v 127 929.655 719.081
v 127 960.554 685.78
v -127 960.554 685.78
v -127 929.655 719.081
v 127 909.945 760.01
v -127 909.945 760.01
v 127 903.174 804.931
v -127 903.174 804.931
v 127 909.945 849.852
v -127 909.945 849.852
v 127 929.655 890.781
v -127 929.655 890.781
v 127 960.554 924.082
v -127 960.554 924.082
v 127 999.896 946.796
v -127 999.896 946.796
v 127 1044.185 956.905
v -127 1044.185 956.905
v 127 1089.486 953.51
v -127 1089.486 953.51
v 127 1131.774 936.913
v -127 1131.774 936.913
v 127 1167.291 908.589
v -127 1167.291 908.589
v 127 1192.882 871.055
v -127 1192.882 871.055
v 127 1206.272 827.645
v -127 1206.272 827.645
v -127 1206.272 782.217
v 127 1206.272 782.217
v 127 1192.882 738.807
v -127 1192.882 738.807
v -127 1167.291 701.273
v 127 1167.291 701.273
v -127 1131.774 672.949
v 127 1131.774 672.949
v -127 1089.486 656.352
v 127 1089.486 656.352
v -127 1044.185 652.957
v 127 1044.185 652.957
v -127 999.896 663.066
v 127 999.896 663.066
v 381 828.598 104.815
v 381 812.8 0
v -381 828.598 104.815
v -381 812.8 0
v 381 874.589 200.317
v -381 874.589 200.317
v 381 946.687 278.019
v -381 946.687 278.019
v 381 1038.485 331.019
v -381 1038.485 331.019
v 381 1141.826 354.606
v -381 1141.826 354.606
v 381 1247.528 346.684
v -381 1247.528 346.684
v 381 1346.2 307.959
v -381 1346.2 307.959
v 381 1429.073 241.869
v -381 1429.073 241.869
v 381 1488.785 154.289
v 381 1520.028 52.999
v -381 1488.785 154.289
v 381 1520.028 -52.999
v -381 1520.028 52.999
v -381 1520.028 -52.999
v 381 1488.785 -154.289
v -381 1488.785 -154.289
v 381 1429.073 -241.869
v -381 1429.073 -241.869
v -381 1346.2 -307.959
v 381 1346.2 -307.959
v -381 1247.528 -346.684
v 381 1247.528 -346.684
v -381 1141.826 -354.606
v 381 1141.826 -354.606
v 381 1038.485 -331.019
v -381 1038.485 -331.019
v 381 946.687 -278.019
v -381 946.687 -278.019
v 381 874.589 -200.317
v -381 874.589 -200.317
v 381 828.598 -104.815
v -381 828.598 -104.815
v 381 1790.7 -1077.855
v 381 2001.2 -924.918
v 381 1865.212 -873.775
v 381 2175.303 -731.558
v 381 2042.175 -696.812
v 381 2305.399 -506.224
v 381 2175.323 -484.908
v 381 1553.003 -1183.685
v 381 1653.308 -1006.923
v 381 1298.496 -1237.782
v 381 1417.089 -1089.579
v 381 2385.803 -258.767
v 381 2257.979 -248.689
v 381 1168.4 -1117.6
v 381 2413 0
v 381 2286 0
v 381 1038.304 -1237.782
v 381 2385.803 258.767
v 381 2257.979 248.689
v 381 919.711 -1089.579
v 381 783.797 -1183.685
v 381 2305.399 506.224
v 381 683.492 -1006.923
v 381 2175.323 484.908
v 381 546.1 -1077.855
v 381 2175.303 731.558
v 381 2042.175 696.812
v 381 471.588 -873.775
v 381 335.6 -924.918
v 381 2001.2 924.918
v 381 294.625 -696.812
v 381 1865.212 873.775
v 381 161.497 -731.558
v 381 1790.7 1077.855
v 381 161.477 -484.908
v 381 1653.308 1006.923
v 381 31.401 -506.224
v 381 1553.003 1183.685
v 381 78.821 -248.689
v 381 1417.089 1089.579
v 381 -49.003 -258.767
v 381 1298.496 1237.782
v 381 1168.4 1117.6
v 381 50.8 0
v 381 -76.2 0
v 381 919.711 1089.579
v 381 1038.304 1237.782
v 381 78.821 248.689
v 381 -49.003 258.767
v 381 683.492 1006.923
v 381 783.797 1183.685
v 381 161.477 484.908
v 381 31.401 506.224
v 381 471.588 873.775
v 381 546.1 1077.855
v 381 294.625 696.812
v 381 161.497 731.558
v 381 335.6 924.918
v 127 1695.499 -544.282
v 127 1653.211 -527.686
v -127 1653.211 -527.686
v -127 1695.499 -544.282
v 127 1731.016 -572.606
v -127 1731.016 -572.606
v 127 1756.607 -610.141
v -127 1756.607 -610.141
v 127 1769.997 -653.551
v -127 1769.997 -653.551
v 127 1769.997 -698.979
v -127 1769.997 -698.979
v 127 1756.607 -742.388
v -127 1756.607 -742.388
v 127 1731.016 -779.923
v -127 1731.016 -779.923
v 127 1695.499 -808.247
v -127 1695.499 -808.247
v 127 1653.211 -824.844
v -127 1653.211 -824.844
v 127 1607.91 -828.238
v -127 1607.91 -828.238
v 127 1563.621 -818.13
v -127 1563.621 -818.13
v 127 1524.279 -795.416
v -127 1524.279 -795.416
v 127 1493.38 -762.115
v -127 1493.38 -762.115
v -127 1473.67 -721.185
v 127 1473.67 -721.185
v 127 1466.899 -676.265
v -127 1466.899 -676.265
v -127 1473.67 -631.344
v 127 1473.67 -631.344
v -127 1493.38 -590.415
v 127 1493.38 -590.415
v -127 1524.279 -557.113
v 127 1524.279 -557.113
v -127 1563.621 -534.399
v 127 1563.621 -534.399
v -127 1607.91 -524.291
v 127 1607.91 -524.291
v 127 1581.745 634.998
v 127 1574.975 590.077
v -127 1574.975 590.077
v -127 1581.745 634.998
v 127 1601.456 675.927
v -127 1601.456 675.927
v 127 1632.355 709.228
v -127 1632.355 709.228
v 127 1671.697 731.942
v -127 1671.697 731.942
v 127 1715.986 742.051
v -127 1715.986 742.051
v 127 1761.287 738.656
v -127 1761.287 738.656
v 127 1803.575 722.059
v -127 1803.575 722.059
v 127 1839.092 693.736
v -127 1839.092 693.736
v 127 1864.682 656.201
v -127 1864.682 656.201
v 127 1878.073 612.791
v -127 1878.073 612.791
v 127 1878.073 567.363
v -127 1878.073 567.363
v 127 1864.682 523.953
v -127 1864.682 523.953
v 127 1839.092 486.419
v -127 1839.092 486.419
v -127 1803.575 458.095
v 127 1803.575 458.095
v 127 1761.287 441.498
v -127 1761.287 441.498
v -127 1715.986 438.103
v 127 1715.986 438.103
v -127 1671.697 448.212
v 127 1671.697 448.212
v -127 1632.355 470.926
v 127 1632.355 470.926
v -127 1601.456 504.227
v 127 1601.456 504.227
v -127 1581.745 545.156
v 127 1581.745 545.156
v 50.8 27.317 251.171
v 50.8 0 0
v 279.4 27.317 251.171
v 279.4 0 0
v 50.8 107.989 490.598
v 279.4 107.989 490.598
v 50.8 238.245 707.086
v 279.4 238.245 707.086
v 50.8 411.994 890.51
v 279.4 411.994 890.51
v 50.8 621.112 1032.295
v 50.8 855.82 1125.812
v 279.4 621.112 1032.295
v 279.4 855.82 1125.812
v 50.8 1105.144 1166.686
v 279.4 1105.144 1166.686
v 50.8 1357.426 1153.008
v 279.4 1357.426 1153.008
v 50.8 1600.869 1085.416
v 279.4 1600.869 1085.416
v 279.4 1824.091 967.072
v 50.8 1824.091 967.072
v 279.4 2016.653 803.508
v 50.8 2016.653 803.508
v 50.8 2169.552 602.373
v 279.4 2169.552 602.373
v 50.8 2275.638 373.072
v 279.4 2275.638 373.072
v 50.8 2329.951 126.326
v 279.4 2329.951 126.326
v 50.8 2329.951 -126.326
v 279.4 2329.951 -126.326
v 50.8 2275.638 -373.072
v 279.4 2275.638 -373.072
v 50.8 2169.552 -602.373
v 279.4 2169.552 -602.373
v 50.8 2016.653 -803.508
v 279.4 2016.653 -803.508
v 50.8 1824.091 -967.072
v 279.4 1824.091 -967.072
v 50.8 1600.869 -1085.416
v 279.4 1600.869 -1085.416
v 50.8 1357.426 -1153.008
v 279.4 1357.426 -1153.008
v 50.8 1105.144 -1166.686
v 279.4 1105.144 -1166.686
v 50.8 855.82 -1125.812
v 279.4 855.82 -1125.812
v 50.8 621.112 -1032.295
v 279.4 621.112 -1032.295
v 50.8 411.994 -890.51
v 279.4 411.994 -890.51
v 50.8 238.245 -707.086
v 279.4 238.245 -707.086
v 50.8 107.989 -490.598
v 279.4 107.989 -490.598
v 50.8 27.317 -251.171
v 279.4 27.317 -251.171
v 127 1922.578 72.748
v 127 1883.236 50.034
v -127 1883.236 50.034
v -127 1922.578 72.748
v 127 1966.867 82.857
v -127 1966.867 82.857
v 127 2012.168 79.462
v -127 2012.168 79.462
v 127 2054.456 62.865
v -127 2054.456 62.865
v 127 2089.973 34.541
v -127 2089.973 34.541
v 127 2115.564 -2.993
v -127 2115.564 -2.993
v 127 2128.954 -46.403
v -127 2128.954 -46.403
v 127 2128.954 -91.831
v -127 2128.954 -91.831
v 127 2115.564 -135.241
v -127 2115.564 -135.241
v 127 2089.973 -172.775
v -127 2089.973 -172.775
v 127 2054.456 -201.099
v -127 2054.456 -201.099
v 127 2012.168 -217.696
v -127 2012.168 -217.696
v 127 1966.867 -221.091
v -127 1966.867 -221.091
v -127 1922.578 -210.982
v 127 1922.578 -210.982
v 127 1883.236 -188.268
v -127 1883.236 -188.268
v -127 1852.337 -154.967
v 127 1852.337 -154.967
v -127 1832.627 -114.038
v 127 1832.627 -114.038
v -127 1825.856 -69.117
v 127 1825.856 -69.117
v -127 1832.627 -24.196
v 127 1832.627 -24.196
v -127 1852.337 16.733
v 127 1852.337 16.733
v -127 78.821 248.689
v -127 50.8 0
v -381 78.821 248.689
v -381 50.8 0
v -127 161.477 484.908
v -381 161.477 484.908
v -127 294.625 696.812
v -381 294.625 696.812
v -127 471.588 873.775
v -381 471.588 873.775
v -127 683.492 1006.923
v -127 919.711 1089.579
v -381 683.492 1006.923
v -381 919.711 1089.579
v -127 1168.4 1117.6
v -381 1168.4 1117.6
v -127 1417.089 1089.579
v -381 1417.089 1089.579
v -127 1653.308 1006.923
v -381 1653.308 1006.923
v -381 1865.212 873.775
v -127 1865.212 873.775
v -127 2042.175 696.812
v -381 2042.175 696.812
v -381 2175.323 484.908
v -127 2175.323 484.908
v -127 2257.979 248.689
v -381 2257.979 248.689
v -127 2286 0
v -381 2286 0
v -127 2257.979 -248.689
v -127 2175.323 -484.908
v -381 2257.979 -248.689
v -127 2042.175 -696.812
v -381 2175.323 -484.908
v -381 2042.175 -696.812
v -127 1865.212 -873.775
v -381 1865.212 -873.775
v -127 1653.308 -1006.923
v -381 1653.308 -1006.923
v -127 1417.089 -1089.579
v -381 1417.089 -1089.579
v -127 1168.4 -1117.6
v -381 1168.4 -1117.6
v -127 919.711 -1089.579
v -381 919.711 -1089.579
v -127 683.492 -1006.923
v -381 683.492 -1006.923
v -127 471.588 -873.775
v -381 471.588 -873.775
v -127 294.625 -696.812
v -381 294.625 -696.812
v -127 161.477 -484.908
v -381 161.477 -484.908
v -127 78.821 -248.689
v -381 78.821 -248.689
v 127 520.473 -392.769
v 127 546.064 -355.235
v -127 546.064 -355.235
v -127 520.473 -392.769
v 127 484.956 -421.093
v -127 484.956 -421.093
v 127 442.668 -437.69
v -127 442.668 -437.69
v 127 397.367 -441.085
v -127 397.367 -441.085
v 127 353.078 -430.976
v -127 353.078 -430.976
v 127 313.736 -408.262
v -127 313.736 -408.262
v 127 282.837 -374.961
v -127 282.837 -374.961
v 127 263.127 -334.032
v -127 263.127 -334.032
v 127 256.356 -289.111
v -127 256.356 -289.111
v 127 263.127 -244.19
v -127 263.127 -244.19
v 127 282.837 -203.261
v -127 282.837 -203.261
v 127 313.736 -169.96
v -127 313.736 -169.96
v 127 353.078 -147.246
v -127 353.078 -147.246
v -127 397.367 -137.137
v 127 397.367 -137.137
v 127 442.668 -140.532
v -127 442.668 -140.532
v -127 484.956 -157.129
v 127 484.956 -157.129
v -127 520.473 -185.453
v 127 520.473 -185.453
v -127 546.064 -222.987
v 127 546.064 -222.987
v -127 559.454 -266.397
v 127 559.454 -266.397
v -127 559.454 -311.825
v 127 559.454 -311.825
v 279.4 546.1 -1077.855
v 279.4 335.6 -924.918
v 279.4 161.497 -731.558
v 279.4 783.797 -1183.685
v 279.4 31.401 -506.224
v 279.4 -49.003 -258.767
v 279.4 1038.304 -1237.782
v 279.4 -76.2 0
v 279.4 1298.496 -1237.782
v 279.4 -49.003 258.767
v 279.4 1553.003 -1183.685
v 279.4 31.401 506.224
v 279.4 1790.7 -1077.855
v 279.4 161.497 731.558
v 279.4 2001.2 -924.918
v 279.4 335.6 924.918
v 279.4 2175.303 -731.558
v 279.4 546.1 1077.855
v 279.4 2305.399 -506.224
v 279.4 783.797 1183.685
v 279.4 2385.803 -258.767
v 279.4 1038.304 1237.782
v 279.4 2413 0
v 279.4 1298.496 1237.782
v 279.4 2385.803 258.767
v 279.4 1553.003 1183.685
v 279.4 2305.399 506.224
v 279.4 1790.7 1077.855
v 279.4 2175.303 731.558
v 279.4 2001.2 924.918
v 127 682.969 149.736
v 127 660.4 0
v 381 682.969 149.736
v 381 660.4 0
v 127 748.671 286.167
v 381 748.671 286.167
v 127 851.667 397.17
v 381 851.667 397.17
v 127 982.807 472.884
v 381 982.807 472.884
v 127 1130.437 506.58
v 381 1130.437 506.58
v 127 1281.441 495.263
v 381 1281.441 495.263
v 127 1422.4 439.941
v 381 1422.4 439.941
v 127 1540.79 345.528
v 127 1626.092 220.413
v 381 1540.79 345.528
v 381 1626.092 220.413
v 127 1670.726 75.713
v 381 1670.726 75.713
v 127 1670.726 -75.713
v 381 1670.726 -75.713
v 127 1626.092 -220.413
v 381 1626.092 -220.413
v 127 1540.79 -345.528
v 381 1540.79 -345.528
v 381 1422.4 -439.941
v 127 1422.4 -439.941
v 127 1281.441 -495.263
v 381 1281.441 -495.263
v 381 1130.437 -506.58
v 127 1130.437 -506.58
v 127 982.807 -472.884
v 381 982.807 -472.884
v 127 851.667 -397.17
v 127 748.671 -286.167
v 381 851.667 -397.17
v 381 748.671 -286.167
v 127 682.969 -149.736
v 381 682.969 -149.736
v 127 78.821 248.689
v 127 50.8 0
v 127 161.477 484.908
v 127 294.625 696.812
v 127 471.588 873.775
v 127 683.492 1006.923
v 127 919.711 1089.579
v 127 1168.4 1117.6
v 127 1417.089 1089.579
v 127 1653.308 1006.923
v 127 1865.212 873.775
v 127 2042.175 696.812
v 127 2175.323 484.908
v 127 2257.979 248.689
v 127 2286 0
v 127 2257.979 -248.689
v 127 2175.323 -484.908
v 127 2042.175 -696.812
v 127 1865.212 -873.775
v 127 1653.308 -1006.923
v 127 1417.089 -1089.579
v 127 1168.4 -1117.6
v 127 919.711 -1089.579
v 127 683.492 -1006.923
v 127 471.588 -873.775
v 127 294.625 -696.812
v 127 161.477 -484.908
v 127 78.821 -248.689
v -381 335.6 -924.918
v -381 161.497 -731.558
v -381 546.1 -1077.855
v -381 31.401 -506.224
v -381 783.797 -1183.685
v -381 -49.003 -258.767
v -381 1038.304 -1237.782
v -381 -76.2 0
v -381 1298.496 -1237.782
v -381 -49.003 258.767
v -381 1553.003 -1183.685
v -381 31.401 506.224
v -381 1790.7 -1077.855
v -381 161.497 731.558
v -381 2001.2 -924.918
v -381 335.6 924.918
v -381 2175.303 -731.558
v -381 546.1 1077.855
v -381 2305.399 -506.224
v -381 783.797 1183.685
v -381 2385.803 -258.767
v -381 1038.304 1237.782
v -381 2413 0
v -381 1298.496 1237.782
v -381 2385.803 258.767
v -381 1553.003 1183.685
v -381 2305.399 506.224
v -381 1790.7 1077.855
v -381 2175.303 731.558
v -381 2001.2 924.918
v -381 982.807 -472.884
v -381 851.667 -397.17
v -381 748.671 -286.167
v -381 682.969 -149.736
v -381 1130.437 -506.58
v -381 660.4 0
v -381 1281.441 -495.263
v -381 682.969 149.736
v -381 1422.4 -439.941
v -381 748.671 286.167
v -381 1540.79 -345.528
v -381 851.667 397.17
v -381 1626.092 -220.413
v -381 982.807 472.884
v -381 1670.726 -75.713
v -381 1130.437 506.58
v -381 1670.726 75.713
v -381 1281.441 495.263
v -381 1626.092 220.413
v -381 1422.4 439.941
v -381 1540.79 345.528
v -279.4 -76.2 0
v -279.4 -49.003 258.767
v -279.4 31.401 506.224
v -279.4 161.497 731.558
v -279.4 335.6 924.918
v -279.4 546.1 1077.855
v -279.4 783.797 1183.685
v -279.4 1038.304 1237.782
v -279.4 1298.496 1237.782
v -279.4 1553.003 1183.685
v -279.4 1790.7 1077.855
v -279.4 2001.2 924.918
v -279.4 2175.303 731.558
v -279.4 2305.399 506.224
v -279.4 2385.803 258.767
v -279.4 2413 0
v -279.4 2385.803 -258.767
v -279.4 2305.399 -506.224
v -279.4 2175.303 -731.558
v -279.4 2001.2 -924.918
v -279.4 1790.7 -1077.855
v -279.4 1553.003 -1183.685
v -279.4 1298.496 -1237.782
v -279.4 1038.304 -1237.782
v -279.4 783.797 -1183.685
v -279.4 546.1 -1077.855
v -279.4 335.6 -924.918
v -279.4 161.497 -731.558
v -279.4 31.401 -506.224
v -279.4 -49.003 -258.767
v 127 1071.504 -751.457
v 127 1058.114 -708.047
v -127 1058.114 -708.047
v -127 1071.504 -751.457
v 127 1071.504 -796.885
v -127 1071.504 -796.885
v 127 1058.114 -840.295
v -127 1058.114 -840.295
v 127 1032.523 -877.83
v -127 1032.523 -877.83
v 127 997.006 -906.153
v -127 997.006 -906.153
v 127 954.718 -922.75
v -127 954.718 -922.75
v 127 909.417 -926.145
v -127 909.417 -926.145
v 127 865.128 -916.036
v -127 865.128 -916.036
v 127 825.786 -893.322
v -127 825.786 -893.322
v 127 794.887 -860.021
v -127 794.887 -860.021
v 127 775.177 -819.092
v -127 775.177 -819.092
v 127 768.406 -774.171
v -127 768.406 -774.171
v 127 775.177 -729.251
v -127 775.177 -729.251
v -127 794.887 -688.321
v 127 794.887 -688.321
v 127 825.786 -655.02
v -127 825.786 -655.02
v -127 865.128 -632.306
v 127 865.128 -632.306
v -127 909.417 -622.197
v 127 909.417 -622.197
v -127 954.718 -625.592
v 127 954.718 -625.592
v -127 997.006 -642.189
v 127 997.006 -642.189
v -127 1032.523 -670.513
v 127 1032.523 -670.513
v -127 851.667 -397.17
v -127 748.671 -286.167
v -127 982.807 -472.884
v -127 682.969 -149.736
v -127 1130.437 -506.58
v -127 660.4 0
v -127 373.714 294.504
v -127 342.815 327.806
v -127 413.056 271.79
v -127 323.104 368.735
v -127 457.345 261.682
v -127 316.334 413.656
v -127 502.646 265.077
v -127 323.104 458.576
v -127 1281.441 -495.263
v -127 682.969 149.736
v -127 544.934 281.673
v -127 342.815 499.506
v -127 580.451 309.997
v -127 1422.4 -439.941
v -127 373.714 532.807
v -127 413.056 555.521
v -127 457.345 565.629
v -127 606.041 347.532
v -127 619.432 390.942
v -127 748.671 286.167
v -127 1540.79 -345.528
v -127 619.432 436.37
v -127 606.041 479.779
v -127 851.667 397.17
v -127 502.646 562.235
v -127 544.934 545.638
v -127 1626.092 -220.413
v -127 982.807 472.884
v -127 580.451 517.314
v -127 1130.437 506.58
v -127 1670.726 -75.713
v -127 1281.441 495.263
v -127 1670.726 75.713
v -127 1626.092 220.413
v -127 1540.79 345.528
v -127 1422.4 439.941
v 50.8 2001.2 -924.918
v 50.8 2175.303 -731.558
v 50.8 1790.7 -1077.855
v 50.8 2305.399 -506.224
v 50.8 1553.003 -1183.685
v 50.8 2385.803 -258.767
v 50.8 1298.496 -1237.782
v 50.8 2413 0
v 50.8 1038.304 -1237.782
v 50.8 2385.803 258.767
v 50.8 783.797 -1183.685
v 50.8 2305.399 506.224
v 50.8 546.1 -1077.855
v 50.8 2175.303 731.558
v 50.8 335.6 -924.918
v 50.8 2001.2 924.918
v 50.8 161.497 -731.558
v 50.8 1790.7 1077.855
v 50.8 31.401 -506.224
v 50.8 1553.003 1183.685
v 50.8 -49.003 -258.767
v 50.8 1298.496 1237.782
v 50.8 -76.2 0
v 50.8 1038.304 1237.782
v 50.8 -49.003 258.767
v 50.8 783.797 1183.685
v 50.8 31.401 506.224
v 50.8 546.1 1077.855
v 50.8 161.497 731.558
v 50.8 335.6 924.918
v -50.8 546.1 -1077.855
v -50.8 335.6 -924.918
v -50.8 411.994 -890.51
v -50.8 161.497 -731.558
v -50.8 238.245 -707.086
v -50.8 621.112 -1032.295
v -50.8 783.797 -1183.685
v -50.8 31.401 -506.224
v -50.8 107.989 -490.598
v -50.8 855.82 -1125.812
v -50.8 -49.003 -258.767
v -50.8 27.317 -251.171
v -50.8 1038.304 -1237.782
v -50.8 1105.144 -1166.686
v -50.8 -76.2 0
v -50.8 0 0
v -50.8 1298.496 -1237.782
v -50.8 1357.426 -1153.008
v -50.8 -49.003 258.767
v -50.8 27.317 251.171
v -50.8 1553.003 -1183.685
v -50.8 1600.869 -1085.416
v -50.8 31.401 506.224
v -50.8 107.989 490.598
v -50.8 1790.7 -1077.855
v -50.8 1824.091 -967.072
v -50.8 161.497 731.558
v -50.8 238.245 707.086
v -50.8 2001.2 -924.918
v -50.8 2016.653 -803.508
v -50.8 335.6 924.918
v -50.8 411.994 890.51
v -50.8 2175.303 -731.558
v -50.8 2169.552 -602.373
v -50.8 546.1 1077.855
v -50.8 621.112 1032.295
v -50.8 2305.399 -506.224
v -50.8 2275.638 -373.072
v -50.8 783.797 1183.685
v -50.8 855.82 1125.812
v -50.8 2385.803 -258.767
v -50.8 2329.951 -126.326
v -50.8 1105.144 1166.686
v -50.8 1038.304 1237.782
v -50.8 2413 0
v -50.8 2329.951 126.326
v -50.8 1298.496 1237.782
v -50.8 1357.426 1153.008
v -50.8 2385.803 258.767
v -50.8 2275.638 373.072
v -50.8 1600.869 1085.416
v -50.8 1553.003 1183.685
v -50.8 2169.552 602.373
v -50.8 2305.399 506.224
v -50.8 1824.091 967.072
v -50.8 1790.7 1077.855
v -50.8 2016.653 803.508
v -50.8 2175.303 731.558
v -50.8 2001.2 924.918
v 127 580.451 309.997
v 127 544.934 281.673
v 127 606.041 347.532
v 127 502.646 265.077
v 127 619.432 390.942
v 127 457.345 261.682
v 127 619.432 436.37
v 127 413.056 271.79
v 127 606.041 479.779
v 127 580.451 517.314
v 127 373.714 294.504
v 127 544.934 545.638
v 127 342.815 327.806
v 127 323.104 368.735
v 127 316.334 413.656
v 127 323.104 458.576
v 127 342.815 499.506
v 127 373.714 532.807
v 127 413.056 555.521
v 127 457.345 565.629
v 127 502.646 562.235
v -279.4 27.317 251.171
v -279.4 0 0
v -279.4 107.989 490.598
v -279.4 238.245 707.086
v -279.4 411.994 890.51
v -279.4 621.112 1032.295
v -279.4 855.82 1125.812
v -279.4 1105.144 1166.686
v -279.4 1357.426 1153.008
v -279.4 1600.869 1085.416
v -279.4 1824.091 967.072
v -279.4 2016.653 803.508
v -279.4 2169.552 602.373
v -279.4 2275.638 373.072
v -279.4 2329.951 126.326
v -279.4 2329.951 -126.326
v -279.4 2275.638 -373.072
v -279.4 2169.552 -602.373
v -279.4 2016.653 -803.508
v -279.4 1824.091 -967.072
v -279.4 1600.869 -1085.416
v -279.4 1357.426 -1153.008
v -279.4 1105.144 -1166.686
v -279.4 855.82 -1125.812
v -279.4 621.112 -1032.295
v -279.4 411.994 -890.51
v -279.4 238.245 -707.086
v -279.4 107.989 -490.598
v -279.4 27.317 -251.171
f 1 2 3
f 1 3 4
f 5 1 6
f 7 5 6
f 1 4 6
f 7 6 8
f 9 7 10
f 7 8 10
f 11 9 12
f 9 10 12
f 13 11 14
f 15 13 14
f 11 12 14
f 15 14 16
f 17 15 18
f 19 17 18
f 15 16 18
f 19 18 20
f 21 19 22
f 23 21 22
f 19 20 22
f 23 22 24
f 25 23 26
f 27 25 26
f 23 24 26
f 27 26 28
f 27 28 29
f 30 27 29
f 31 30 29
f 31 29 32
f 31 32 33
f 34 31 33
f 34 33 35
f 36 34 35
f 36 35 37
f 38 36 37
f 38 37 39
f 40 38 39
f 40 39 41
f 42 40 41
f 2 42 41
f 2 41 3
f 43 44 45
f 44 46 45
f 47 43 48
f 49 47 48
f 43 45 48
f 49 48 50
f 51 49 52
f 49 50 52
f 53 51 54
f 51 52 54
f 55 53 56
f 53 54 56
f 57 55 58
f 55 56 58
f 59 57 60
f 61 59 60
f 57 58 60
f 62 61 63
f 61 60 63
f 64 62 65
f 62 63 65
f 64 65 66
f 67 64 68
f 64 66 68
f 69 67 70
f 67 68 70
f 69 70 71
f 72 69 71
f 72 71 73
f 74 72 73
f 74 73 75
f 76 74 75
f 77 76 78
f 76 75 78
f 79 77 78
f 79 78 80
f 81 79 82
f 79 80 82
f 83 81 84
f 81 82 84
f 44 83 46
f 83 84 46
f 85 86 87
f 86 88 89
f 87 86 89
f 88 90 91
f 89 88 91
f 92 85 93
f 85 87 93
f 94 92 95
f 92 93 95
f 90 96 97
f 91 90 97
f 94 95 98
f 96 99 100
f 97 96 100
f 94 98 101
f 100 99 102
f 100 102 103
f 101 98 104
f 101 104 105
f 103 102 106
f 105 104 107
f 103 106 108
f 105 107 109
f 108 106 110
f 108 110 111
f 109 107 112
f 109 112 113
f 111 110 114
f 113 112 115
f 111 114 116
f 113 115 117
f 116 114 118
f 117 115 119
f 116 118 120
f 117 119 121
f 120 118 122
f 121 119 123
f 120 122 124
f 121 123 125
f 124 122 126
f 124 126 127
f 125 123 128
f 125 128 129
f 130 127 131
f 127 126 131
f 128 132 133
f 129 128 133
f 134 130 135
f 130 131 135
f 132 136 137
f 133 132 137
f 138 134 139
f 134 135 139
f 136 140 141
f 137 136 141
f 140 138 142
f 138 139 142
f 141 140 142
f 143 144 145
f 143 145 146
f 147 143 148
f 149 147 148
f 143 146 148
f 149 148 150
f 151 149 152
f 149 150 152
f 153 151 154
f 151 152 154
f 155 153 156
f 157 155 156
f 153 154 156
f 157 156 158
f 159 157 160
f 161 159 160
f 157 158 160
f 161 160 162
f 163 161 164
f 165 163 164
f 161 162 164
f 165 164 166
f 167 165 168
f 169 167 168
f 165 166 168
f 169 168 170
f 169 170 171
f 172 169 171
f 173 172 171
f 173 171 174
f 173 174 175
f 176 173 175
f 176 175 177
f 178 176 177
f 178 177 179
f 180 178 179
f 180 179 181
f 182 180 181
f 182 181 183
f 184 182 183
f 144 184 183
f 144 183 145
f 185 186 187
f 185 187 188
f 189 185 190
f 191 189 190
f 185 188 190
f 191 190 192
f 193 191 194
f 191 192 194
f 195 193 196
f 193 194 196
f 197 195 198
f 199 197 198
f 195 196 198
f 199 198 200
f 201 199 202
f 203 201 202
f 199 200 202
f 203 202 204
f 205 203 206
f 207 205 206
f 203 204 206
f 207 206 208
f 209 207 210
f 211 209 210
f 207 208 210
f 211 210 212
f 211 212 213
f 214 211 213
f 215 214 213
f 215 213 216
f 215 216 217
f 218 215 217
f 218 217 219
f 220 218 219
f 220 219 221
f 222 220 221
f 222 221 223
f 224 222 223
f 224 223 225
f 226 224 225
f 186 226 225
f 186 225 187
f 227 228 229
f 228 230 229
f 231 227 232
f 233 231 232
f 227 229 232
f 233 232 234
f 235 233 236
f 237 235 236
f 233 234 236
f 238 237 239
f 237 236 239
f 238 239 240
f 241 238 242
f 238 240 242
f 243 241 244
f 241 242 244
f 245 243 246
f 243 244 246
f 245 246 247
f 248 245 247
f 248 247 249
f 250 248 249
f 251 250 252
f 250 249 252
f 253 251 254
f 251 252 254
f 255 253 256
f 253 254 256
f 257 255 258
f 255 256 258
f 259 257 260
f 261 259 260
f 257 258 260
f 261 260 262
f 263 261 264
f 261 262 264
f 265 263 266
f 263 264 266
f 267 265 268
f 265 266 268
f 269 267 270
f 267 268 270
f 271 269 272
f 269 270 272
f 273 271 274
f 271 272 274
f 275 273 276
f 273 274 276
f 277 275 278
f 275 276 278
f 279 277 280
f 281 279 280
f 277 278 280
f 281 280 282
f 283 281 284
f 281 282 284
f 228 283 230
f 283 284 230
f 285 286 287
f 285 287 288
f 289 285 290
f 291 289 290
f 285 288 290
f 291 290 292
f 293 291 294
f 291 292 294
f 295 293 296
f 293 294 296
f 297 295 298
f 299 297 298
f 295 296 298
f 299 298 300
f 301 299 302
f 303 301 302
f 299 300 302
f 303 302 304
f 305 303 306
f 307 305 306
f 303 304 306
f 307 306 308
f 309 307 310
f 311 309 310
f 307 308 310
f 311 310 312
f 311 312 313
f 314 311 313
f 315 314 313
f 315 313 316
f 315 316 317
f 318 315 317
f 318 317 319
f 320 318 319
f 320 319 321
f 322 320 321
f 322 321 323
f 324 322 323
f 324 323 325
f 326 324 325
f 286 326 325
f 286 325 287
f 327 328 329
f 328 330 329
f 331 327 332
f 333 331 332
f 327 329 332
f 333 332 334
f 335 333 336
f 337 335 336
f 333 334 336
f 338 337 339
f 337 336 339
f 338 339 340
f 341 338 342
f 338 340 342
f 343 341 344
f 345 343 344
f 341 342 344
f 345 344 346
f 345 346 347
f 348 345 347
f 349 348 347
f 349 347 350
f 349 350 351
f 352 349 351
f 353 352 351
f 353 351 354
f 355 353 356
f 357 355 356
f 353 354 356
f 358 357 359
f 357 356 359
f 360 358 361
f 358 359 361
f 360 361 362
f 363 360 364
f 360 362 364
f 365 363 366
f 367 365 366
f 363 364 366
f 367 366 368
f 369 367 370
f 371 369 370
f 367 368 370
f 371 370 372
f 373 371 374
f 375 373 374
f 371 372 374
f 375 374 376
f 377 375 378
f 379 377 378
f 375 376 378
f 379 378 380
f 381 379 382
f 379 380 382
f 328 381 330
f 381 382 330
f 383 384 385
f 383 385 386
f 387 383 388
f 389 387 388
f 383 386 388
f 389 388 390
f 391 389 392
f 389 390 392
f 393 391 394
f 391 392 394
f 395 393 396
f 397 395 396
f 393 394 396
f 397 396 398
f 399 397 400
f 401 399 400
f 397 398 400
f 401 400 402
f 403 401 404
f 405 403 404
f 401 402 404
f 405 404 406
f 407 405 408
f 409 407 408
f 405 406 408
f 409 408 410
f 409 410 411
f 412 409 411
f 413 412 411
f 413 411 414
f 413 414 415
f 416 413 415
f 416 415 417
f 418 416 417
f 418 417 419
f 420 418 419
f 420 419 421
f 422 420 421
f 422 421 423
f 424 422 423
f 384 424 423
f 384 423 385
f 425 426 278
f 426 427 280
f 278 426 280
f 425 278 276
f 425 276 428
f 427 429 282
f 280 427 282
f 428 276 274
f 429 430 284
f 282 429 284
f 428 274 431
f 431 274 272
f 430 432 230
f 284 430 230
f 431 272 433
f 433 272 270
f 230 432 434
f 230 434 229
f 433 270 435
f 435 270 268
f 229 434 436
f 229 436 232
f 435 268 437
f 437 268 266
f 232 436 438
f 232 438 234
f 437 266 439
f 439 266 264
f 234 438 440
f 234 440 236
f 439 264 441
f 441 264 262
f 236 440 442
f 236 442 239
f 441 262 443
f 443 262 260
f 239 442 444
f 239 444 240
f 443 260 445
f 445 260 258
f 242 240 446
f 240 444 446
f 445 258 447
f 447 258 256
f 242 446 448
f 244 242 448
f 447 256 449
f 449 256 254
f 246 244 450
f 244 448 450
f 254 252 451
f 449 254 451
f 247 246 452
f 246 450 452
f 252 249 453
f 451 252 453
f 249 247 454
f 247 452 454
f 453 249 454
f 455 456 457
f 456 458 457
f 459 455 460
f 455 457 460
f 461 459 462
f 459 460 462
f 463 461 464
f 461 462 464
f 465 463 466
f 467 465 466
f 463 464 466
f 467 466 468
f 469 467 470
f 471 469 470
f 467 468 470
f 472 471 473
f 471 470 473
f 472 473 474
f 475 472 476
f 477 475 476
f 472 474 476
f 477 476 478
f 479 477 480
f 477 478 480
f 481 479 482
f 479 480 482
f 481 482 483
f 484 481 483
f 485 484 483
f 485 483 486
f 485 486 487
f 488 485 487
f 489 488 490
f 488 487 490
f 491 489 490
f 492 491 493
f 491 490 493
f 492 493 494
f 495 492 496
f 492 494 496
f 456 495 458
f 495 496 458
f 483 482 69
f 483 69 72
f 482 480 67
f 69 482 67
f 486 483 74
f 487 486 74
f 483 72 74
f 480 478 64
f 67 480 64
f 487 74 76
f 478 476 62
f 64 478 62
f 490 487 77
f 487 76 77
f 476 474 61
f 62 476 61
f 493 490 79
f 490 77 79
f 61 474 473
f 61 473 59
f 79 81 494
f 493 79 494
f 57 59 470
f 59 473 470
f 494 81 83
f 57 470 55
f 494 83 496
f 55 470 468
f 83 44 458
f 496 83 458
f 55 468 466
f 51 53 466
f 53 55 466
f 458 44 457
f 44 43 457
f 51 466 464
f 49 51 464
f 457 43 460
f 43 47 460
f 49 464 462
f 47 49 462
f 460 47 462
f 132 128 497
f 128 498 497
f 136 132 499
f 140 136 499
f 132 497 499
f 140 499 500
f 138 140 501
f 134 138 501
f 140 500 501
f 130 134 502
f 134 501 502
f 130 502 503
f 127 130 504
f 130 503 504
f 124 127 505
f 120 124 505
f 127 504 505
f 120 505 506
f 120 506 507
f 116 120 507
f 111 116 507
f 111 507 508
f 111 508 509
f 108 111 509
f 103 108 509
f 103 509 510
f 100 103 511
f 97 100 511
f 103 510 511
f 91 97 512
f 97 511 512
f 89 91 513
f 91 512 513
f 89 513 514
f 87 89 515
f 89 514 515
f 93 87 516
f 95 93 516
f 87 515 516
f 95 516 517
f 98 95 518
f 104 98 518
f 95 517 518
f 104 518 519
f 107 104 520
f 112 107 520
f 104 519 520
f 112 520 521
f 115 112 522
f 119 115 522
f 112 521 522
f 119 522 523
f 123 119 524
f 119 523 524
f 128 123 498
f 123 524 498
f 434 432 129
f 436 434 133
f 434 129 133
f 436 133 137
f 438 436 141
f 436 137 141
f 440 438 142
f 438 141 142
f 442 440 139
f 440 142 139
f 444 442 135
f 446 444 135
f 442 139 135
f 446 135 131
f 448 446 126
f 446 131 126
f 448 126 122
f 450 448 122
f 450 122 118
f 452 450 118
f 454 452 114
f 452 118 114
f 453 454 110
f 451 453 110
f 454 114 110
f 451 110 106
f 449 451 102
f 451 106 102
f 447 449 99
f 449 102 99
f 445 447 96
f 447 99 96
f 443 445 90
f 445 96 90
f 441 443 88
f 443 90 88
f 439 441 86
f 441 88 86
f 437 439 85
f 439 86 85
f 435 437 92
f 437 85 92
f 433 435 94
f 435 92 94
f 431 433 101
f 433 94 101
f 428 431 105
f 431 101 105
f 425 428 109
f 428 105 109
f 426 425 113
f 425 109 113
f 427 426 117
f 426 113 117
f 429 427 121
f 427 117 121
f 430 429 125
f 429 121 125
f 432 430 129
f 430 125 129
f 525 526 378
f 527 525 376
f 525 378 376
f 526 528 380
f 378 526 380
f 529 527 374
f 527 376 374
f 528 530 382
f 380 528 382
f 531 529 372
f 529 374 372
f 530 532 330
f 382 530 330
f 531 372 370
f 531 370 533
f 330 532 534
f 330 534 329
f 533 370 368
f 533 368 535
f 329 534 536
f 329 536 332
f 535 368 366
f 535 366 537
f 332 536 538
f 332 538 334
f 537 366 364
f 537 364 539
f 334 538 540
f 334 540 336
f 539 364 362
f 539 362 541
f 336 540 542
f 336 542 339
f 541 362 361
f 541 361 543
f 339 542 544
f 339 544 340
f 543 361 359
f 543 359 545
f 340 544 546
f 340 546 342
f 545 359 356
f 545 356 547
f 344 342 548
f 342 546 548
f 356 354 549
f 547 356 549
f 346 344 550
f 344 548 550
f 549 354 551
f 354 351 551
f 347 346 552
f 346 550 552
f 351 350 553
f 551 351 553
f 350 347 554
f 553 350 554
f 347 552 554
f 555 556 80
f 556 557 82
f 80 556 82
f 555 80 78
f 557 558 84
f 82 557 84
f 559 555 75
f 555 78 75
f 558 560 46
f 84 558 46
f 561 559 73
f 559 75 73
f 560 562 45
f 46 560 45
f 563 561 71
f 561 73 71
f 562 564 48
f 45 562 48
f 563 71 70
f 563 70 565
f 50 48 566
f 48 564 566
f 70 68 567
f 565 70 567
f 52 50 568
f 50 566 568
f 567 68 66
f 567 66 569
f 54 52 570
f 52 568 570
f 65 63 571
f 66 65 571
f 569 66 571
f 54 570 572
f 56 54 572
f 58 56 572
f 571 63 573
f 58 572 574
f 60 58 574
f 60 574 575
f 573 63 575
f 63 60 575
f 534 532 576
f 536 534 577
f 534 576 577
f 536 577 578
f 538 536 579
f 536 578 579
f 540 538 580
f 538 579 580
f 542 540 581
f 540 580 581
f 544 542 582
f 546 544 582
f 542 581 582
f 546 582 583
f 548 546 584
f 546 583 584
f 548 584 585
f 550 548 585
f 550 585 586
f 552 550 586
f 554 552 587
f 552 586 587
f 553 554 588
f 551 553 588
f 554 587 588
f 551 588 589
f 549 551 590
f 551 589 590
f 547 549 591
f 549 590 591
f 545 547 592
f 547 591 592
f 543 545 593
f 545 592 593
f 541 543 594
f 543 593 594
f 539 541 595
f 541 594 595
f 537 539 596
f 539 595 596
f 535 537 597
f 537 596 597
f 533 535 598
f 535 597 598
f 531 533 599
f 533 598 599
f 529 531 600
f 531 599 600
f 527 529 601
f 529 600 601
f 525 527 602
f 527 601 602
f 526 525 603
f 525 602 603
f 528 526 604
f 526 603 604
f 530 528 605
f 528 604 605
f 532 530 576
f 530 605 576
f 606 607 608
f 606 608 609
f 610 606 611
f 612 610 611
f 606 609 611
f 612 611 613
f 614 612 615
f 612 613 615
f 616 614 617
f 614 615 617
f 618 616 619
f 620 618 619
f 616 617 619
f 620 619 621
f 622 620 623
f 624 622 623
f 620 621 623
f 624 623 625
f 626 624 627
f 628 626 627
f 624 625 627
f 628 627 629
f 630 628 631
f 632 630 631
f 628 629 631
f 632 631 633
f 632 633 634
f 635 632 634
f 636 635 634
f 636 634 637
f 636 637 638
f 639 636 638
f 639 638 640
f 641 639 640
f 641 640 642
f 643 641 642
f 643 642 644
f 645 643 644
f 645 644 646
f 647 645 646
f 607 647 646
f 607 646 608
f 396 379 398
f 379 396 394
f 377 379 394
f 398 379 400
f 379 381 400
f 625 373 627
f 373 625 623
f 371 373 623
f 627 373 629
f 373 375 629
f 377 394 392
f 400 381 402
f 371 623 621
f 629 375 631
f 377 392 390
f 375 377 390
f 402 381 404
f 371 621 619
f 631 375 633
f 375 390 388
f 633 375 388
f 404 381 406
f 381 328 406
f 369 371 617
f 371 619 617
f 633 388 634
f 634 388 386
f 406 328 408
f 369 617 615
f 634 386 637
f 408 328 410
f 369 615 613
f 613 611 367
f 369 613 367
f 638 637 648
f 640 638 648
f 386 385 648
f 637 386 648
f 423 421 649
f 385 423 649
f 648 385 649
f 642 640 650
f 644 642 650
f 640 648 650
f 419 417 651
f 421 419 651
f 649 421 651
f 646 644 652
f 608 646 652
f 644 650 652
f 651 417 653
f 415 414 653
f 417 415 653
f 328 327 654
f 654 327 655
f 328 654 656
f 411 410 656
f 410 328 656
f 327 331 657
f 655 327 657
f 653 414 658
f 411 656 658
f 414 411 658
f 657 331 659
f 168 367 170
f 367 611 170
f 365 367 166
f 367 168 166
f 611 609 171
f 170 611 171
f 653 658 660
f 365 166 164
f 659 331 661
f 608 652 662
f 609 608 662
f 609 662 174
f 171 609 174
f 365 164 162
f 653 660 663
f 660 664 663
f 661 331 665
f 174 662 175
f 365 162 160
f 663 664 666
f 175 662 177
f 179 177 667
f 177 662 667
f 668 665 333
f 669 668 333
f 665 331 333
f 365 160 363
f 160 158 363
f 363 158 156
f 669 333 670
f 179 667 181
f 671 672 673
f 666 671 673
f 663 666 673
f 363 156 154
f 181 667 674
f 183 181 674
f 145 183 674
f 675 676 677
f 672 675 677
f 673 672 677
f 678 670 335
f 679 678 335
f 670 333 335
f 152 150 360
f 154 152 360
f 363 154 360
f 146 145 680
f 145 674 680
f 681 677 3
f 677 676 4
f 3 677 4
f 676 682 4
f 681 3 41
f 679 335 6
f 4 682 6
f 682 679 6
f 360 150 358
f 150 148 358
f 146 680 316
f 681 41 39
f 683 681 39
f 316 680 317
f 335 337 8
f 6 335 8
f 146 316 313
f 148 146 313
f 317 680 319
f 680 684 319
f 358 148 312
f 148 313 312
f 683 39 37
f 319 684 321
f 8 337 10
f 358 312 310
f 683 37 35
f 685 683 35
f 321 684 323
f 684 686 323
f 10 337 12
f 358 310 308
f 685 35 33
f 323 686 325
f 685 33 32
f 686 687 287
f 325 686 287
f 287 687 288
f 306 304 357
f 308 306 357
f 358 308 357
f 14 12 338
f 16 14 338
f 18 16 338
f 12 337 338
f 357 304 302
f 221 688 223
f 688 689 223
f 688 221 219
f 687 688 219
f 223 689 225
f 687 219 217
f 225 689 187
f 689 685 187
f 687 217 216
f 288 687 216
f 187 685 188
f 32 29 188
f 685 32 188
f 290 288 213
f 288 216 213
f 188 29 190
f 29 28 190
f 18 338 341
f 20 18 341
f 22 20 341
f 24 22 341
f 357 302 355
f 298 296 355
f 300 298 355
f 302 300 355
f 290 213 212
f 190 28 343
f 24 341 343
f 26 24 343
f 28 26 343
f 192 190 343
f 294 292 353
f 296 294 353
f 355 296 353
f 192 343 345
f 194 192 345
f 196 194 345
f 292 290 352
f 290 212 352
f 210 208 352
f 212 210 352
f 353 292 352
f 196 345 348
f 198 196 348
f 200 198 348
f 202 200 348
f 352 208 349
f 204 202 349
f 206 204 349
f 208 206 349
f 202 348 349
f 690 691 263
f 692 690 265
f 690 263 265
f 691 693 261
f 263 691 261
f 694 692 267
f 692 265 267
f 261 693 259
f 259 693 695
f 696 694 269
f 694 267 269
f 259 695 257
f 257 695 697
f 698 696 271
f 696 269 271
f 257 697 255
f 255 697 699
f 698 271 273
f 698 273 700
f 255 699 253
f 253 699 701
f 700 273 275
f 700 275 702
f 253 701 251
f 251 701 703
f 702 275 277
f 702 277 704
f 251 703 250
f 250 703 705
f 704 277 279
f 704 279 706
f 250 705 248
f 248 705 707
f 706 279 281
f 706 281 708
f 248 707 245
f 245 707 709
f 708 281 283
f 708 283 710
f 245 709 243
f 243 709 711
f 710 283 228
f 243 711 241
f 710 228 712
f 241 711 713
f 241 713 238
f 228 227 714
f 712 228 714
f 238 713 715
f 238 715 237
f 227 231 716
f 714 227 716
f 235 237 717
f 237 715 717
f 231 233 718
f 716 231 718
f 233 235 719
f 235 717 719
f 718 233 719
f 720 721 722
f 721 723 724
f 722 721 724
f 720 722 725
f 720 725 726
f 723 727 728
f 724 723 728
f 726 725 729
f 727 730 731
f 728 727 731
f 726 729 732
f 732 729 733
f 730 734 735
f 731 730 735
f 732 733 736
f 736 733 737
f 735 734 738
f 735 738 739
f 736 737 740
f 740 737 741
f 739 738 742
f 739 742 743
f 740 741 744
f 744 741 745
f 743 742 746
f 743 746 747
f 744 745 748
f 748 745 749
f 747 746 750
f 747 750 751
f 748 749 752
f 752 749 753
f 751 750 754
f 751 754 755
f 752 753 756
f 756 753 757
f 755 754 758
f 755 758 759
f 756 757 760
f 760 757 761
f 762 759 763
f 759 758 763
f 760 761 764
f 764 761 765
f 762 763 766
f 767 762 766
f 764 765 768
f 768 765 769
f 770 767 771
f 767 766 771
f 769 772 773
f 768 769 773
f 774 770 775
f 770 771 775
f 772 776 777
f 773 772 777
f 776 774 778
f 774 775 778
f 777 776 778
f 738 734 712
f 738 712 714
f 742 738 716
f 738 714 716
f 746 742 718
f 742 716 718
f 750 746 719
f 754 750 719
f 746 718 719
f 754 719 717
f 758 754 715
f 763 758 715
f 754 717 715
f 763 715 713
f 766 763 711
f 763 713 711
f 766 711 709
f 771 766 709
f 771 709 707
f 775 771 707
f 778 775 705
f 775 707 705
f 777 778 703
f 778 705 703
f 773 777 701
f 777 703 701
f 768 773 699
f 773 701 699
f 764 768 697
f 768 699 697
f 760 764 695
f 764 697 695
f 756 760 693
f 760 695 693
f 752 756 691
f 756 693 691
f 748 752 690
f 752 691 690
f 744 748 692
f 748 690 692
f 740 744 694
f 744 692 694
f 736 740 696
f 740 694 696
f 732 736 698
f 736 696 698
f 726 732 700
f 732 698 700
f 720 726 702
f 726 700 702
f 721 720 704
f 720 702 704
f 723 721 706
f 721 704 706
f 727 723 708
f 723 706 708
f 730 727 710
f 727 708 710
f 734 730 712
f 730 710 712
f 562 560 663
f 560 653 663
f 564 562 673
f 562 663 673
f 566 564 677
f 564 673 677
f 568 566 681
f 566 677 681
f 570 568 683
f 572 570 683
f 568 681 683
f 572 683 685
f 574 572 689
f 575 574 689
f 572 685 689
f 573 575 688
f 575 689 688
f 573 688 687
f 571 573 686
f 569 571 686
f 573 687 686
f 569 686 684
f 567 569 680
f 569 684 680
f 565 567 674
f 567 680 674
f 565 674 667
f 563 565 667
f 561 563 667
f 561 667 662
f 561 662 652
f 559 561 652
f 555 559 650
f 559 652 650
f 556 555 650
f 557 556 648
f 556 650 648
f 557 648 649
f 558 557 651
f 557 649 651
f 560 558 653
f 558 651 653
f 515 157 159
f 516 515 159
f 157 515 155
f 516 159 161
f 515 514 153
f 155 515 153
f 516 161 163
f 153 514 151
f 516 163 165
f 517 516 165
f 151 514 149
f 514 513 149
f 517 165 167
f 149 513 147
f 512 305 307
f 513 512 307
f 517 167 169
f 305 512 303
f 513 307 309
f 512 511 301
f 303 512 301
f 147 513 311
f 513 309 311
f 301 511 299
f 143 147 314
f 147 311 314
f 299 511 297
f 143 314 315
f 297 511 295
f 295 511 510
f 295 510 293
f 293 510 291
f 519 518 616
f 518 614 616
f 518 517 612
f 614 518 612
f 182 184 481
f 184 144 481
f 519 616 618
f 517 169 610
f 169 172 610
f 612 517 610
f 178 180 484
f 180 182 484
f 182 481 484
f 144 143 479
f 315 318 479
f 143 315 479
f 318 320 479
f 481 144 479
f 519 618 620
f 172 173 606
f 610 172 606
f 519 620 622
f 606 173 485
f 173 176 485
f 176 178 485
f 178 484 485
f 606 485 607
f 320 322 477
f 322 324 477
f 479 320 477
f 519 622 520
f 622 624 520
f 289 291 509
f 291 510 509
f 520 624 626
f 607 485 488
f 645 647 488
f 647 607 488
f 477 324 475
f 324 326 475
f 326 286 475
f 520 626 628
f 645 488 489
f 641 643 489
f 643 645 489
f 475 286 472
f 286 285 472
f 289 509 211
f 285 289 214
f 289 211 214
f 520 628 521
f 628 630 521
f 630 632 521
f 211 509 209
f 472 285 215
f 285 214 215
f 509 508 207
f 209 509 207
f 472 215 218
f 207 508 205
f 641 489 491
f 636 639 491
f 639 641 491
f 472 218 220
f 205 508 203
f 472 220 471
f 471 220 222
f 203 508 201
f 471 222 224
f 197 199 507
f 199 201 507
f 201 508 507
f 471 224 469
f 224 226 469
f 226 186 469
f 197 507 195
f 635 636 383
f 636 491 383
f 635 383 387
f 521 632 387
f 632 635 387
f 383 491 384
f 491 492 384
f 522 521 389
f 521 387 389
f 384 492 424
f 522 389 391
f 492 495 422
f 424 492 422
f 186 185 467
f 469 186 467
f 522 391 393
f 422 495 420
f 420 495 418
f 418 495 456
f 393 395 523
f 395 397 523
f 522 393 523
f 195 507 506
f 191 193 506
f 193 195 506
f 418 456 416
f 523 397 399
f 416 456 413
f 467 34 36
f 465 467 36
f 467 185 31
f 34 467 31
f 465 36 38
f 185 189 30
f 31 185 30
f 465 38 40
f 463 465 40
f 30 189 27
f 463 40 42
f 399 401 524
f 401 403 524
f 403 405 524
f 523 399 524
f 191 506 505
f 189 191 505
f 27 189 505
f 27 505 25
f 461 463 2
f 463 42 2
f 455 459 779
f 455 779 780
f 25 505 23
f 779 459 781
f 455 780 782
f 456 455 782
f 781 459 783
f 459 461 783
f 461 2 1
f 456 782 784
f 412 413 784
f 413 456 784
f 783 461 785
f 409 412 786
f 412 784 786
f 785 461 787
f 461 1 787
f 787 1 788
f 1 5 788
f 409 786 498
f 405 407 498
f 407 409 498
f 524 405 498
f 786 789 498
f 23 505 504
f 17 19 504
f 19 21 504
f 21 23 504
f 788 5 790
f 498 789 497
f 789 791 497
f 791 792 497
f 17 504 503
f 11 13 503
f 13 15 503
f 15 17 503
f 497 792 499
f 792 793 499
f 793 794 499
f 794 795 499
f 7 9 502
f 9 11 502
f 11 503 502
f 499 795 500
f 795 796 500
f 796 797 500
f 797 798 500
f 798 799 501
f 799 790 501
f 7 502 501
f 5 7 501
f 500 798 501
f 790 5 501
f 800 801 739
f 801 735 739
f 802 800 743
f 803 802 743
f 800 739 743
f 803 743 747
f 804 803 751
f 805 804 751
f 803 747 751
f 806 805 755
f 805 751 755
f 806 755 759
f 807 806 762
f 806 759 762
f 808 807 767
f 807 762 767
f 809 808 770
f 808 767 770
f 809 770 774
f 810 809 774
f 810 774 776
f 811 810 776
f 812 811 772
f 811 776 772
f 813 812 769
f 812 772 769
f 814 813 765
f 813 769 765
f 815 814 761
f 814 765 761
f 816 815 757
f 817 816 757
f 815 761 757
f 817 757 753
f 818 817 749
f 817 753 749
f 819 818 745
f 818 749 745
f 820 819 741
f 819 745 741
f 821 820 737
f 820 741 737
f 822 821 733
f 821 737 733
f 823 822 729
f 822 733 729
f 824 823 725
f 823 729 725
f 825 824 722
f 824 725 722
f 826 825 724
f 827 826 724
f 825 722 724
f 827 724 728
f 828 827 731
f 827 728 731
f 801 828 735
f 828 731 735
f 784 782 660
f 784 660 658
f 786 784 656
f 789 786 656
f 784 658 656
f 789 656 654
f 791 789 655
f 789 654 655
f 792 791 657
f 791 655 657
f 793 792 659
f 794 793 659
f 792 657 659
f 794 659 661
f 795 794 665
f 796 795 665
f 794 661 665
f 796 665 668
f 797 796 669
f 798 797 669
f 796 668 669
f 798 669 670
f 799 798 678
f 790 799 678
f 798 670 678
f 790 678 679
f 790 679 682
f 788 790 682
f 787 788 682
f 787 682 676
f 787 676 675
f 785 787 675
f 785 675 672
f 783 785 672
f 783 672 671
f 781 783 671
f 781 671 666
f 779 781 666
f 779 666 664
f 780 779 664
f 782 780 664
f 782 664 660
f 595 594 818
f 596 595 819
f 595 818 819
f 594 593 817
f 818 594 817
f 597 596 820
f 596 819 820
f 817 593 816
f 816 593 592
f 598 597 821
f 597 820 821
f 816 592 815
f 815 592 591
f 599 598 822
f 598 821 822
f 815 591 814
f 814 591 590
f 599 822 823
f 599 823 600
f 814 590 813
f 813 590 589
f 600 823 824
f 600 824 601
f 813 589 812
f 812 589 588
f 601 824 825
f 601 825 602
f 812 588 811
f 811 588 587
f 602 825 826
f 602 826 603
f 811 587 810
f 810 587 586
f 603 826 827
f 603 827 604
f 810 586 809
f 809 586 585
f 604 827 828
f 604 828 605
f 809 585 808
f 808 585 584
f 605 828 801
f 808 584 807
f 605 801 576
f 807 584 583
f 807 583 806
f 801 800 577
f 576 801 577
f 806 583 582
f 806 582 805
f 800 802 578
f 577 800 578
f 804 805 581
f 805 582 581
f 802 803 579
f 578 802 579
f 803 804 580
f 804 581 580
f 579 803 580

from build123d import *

# Parameters (mm, degrees)
F2_R            = 152.4
F3_DEPTH        = 2230.12
F4_DEPTH        = 508.001
F4_COPIES_COUNT = 7


# Not quite as in the source:
# - a pattern or mirror of a feature is missing from the dataset's text; its kind, count and spacing are read off the source's solid
# - a feature names something its author has since deleted; it is built from what else it names


with BuildPart() as f1:
    # F0 (on Top) → F1 (revolve)
    with BuildSketch(Plane.XY):
        Polygon((381, 812.8), (-381, 812.8), (-381, 660.4), (-127, 660.4), (-127, 50.8), (-381, 50.8), (-381, -76.2), (-279.4, -76.2), (-279.4, 0), (-50.8, 0), (-50.8, -76.2), (0, -76.2), (50.8, -76.2), (50.8, 0), (279.4, 0), (279.4, -76.2), (381, -76.2), (381, 50.8), (127, 50.8), (127, 660.4), (381, 660.4), align=None)
    revolve(axis=Axis((-38.2948741317, 1168.4, 0), (-1, 0, 0)))

    # F2 (on face) → F3 (cut)
    with BuildSketch(Plane(origin=(-127, 0, 0), x_dir=(0, -1, 0), z_dir=(-1, 0, 0))):
        with Locations((-1727.3747412179, 590.0771802742)):
            Circle(F2_R)
    extrude(amount=-F3_DEPTH, mode=Mode.SUBTRACT)

    # F2 (on face) → F4 (cut, through all)
    with BuildSketch(Plane(origin=(-127, 0, 0), x_dir=(0, -1, 0), z_dir=(-1, 0, 0))):
        with Locations((-1727.3747412179, 590.0771802742)):
            Circle(F2_R)
    f4 = extrude(amount=-F4_DEPTH, mode=Mode.SUBTRACT)

    # F4_copies: F4 ×7 about axis
    f4_copies_axis = Axis((0, 1168.4, 0), (1, 0, 0))
    for i in range(1, F4_COPIES_COUNT):
        add(f4.rotate(f4_copies_axis, i * 360 / F4_COPIES_COUNT), mode=Mode.SUBTRACT)


solid = f1.part
